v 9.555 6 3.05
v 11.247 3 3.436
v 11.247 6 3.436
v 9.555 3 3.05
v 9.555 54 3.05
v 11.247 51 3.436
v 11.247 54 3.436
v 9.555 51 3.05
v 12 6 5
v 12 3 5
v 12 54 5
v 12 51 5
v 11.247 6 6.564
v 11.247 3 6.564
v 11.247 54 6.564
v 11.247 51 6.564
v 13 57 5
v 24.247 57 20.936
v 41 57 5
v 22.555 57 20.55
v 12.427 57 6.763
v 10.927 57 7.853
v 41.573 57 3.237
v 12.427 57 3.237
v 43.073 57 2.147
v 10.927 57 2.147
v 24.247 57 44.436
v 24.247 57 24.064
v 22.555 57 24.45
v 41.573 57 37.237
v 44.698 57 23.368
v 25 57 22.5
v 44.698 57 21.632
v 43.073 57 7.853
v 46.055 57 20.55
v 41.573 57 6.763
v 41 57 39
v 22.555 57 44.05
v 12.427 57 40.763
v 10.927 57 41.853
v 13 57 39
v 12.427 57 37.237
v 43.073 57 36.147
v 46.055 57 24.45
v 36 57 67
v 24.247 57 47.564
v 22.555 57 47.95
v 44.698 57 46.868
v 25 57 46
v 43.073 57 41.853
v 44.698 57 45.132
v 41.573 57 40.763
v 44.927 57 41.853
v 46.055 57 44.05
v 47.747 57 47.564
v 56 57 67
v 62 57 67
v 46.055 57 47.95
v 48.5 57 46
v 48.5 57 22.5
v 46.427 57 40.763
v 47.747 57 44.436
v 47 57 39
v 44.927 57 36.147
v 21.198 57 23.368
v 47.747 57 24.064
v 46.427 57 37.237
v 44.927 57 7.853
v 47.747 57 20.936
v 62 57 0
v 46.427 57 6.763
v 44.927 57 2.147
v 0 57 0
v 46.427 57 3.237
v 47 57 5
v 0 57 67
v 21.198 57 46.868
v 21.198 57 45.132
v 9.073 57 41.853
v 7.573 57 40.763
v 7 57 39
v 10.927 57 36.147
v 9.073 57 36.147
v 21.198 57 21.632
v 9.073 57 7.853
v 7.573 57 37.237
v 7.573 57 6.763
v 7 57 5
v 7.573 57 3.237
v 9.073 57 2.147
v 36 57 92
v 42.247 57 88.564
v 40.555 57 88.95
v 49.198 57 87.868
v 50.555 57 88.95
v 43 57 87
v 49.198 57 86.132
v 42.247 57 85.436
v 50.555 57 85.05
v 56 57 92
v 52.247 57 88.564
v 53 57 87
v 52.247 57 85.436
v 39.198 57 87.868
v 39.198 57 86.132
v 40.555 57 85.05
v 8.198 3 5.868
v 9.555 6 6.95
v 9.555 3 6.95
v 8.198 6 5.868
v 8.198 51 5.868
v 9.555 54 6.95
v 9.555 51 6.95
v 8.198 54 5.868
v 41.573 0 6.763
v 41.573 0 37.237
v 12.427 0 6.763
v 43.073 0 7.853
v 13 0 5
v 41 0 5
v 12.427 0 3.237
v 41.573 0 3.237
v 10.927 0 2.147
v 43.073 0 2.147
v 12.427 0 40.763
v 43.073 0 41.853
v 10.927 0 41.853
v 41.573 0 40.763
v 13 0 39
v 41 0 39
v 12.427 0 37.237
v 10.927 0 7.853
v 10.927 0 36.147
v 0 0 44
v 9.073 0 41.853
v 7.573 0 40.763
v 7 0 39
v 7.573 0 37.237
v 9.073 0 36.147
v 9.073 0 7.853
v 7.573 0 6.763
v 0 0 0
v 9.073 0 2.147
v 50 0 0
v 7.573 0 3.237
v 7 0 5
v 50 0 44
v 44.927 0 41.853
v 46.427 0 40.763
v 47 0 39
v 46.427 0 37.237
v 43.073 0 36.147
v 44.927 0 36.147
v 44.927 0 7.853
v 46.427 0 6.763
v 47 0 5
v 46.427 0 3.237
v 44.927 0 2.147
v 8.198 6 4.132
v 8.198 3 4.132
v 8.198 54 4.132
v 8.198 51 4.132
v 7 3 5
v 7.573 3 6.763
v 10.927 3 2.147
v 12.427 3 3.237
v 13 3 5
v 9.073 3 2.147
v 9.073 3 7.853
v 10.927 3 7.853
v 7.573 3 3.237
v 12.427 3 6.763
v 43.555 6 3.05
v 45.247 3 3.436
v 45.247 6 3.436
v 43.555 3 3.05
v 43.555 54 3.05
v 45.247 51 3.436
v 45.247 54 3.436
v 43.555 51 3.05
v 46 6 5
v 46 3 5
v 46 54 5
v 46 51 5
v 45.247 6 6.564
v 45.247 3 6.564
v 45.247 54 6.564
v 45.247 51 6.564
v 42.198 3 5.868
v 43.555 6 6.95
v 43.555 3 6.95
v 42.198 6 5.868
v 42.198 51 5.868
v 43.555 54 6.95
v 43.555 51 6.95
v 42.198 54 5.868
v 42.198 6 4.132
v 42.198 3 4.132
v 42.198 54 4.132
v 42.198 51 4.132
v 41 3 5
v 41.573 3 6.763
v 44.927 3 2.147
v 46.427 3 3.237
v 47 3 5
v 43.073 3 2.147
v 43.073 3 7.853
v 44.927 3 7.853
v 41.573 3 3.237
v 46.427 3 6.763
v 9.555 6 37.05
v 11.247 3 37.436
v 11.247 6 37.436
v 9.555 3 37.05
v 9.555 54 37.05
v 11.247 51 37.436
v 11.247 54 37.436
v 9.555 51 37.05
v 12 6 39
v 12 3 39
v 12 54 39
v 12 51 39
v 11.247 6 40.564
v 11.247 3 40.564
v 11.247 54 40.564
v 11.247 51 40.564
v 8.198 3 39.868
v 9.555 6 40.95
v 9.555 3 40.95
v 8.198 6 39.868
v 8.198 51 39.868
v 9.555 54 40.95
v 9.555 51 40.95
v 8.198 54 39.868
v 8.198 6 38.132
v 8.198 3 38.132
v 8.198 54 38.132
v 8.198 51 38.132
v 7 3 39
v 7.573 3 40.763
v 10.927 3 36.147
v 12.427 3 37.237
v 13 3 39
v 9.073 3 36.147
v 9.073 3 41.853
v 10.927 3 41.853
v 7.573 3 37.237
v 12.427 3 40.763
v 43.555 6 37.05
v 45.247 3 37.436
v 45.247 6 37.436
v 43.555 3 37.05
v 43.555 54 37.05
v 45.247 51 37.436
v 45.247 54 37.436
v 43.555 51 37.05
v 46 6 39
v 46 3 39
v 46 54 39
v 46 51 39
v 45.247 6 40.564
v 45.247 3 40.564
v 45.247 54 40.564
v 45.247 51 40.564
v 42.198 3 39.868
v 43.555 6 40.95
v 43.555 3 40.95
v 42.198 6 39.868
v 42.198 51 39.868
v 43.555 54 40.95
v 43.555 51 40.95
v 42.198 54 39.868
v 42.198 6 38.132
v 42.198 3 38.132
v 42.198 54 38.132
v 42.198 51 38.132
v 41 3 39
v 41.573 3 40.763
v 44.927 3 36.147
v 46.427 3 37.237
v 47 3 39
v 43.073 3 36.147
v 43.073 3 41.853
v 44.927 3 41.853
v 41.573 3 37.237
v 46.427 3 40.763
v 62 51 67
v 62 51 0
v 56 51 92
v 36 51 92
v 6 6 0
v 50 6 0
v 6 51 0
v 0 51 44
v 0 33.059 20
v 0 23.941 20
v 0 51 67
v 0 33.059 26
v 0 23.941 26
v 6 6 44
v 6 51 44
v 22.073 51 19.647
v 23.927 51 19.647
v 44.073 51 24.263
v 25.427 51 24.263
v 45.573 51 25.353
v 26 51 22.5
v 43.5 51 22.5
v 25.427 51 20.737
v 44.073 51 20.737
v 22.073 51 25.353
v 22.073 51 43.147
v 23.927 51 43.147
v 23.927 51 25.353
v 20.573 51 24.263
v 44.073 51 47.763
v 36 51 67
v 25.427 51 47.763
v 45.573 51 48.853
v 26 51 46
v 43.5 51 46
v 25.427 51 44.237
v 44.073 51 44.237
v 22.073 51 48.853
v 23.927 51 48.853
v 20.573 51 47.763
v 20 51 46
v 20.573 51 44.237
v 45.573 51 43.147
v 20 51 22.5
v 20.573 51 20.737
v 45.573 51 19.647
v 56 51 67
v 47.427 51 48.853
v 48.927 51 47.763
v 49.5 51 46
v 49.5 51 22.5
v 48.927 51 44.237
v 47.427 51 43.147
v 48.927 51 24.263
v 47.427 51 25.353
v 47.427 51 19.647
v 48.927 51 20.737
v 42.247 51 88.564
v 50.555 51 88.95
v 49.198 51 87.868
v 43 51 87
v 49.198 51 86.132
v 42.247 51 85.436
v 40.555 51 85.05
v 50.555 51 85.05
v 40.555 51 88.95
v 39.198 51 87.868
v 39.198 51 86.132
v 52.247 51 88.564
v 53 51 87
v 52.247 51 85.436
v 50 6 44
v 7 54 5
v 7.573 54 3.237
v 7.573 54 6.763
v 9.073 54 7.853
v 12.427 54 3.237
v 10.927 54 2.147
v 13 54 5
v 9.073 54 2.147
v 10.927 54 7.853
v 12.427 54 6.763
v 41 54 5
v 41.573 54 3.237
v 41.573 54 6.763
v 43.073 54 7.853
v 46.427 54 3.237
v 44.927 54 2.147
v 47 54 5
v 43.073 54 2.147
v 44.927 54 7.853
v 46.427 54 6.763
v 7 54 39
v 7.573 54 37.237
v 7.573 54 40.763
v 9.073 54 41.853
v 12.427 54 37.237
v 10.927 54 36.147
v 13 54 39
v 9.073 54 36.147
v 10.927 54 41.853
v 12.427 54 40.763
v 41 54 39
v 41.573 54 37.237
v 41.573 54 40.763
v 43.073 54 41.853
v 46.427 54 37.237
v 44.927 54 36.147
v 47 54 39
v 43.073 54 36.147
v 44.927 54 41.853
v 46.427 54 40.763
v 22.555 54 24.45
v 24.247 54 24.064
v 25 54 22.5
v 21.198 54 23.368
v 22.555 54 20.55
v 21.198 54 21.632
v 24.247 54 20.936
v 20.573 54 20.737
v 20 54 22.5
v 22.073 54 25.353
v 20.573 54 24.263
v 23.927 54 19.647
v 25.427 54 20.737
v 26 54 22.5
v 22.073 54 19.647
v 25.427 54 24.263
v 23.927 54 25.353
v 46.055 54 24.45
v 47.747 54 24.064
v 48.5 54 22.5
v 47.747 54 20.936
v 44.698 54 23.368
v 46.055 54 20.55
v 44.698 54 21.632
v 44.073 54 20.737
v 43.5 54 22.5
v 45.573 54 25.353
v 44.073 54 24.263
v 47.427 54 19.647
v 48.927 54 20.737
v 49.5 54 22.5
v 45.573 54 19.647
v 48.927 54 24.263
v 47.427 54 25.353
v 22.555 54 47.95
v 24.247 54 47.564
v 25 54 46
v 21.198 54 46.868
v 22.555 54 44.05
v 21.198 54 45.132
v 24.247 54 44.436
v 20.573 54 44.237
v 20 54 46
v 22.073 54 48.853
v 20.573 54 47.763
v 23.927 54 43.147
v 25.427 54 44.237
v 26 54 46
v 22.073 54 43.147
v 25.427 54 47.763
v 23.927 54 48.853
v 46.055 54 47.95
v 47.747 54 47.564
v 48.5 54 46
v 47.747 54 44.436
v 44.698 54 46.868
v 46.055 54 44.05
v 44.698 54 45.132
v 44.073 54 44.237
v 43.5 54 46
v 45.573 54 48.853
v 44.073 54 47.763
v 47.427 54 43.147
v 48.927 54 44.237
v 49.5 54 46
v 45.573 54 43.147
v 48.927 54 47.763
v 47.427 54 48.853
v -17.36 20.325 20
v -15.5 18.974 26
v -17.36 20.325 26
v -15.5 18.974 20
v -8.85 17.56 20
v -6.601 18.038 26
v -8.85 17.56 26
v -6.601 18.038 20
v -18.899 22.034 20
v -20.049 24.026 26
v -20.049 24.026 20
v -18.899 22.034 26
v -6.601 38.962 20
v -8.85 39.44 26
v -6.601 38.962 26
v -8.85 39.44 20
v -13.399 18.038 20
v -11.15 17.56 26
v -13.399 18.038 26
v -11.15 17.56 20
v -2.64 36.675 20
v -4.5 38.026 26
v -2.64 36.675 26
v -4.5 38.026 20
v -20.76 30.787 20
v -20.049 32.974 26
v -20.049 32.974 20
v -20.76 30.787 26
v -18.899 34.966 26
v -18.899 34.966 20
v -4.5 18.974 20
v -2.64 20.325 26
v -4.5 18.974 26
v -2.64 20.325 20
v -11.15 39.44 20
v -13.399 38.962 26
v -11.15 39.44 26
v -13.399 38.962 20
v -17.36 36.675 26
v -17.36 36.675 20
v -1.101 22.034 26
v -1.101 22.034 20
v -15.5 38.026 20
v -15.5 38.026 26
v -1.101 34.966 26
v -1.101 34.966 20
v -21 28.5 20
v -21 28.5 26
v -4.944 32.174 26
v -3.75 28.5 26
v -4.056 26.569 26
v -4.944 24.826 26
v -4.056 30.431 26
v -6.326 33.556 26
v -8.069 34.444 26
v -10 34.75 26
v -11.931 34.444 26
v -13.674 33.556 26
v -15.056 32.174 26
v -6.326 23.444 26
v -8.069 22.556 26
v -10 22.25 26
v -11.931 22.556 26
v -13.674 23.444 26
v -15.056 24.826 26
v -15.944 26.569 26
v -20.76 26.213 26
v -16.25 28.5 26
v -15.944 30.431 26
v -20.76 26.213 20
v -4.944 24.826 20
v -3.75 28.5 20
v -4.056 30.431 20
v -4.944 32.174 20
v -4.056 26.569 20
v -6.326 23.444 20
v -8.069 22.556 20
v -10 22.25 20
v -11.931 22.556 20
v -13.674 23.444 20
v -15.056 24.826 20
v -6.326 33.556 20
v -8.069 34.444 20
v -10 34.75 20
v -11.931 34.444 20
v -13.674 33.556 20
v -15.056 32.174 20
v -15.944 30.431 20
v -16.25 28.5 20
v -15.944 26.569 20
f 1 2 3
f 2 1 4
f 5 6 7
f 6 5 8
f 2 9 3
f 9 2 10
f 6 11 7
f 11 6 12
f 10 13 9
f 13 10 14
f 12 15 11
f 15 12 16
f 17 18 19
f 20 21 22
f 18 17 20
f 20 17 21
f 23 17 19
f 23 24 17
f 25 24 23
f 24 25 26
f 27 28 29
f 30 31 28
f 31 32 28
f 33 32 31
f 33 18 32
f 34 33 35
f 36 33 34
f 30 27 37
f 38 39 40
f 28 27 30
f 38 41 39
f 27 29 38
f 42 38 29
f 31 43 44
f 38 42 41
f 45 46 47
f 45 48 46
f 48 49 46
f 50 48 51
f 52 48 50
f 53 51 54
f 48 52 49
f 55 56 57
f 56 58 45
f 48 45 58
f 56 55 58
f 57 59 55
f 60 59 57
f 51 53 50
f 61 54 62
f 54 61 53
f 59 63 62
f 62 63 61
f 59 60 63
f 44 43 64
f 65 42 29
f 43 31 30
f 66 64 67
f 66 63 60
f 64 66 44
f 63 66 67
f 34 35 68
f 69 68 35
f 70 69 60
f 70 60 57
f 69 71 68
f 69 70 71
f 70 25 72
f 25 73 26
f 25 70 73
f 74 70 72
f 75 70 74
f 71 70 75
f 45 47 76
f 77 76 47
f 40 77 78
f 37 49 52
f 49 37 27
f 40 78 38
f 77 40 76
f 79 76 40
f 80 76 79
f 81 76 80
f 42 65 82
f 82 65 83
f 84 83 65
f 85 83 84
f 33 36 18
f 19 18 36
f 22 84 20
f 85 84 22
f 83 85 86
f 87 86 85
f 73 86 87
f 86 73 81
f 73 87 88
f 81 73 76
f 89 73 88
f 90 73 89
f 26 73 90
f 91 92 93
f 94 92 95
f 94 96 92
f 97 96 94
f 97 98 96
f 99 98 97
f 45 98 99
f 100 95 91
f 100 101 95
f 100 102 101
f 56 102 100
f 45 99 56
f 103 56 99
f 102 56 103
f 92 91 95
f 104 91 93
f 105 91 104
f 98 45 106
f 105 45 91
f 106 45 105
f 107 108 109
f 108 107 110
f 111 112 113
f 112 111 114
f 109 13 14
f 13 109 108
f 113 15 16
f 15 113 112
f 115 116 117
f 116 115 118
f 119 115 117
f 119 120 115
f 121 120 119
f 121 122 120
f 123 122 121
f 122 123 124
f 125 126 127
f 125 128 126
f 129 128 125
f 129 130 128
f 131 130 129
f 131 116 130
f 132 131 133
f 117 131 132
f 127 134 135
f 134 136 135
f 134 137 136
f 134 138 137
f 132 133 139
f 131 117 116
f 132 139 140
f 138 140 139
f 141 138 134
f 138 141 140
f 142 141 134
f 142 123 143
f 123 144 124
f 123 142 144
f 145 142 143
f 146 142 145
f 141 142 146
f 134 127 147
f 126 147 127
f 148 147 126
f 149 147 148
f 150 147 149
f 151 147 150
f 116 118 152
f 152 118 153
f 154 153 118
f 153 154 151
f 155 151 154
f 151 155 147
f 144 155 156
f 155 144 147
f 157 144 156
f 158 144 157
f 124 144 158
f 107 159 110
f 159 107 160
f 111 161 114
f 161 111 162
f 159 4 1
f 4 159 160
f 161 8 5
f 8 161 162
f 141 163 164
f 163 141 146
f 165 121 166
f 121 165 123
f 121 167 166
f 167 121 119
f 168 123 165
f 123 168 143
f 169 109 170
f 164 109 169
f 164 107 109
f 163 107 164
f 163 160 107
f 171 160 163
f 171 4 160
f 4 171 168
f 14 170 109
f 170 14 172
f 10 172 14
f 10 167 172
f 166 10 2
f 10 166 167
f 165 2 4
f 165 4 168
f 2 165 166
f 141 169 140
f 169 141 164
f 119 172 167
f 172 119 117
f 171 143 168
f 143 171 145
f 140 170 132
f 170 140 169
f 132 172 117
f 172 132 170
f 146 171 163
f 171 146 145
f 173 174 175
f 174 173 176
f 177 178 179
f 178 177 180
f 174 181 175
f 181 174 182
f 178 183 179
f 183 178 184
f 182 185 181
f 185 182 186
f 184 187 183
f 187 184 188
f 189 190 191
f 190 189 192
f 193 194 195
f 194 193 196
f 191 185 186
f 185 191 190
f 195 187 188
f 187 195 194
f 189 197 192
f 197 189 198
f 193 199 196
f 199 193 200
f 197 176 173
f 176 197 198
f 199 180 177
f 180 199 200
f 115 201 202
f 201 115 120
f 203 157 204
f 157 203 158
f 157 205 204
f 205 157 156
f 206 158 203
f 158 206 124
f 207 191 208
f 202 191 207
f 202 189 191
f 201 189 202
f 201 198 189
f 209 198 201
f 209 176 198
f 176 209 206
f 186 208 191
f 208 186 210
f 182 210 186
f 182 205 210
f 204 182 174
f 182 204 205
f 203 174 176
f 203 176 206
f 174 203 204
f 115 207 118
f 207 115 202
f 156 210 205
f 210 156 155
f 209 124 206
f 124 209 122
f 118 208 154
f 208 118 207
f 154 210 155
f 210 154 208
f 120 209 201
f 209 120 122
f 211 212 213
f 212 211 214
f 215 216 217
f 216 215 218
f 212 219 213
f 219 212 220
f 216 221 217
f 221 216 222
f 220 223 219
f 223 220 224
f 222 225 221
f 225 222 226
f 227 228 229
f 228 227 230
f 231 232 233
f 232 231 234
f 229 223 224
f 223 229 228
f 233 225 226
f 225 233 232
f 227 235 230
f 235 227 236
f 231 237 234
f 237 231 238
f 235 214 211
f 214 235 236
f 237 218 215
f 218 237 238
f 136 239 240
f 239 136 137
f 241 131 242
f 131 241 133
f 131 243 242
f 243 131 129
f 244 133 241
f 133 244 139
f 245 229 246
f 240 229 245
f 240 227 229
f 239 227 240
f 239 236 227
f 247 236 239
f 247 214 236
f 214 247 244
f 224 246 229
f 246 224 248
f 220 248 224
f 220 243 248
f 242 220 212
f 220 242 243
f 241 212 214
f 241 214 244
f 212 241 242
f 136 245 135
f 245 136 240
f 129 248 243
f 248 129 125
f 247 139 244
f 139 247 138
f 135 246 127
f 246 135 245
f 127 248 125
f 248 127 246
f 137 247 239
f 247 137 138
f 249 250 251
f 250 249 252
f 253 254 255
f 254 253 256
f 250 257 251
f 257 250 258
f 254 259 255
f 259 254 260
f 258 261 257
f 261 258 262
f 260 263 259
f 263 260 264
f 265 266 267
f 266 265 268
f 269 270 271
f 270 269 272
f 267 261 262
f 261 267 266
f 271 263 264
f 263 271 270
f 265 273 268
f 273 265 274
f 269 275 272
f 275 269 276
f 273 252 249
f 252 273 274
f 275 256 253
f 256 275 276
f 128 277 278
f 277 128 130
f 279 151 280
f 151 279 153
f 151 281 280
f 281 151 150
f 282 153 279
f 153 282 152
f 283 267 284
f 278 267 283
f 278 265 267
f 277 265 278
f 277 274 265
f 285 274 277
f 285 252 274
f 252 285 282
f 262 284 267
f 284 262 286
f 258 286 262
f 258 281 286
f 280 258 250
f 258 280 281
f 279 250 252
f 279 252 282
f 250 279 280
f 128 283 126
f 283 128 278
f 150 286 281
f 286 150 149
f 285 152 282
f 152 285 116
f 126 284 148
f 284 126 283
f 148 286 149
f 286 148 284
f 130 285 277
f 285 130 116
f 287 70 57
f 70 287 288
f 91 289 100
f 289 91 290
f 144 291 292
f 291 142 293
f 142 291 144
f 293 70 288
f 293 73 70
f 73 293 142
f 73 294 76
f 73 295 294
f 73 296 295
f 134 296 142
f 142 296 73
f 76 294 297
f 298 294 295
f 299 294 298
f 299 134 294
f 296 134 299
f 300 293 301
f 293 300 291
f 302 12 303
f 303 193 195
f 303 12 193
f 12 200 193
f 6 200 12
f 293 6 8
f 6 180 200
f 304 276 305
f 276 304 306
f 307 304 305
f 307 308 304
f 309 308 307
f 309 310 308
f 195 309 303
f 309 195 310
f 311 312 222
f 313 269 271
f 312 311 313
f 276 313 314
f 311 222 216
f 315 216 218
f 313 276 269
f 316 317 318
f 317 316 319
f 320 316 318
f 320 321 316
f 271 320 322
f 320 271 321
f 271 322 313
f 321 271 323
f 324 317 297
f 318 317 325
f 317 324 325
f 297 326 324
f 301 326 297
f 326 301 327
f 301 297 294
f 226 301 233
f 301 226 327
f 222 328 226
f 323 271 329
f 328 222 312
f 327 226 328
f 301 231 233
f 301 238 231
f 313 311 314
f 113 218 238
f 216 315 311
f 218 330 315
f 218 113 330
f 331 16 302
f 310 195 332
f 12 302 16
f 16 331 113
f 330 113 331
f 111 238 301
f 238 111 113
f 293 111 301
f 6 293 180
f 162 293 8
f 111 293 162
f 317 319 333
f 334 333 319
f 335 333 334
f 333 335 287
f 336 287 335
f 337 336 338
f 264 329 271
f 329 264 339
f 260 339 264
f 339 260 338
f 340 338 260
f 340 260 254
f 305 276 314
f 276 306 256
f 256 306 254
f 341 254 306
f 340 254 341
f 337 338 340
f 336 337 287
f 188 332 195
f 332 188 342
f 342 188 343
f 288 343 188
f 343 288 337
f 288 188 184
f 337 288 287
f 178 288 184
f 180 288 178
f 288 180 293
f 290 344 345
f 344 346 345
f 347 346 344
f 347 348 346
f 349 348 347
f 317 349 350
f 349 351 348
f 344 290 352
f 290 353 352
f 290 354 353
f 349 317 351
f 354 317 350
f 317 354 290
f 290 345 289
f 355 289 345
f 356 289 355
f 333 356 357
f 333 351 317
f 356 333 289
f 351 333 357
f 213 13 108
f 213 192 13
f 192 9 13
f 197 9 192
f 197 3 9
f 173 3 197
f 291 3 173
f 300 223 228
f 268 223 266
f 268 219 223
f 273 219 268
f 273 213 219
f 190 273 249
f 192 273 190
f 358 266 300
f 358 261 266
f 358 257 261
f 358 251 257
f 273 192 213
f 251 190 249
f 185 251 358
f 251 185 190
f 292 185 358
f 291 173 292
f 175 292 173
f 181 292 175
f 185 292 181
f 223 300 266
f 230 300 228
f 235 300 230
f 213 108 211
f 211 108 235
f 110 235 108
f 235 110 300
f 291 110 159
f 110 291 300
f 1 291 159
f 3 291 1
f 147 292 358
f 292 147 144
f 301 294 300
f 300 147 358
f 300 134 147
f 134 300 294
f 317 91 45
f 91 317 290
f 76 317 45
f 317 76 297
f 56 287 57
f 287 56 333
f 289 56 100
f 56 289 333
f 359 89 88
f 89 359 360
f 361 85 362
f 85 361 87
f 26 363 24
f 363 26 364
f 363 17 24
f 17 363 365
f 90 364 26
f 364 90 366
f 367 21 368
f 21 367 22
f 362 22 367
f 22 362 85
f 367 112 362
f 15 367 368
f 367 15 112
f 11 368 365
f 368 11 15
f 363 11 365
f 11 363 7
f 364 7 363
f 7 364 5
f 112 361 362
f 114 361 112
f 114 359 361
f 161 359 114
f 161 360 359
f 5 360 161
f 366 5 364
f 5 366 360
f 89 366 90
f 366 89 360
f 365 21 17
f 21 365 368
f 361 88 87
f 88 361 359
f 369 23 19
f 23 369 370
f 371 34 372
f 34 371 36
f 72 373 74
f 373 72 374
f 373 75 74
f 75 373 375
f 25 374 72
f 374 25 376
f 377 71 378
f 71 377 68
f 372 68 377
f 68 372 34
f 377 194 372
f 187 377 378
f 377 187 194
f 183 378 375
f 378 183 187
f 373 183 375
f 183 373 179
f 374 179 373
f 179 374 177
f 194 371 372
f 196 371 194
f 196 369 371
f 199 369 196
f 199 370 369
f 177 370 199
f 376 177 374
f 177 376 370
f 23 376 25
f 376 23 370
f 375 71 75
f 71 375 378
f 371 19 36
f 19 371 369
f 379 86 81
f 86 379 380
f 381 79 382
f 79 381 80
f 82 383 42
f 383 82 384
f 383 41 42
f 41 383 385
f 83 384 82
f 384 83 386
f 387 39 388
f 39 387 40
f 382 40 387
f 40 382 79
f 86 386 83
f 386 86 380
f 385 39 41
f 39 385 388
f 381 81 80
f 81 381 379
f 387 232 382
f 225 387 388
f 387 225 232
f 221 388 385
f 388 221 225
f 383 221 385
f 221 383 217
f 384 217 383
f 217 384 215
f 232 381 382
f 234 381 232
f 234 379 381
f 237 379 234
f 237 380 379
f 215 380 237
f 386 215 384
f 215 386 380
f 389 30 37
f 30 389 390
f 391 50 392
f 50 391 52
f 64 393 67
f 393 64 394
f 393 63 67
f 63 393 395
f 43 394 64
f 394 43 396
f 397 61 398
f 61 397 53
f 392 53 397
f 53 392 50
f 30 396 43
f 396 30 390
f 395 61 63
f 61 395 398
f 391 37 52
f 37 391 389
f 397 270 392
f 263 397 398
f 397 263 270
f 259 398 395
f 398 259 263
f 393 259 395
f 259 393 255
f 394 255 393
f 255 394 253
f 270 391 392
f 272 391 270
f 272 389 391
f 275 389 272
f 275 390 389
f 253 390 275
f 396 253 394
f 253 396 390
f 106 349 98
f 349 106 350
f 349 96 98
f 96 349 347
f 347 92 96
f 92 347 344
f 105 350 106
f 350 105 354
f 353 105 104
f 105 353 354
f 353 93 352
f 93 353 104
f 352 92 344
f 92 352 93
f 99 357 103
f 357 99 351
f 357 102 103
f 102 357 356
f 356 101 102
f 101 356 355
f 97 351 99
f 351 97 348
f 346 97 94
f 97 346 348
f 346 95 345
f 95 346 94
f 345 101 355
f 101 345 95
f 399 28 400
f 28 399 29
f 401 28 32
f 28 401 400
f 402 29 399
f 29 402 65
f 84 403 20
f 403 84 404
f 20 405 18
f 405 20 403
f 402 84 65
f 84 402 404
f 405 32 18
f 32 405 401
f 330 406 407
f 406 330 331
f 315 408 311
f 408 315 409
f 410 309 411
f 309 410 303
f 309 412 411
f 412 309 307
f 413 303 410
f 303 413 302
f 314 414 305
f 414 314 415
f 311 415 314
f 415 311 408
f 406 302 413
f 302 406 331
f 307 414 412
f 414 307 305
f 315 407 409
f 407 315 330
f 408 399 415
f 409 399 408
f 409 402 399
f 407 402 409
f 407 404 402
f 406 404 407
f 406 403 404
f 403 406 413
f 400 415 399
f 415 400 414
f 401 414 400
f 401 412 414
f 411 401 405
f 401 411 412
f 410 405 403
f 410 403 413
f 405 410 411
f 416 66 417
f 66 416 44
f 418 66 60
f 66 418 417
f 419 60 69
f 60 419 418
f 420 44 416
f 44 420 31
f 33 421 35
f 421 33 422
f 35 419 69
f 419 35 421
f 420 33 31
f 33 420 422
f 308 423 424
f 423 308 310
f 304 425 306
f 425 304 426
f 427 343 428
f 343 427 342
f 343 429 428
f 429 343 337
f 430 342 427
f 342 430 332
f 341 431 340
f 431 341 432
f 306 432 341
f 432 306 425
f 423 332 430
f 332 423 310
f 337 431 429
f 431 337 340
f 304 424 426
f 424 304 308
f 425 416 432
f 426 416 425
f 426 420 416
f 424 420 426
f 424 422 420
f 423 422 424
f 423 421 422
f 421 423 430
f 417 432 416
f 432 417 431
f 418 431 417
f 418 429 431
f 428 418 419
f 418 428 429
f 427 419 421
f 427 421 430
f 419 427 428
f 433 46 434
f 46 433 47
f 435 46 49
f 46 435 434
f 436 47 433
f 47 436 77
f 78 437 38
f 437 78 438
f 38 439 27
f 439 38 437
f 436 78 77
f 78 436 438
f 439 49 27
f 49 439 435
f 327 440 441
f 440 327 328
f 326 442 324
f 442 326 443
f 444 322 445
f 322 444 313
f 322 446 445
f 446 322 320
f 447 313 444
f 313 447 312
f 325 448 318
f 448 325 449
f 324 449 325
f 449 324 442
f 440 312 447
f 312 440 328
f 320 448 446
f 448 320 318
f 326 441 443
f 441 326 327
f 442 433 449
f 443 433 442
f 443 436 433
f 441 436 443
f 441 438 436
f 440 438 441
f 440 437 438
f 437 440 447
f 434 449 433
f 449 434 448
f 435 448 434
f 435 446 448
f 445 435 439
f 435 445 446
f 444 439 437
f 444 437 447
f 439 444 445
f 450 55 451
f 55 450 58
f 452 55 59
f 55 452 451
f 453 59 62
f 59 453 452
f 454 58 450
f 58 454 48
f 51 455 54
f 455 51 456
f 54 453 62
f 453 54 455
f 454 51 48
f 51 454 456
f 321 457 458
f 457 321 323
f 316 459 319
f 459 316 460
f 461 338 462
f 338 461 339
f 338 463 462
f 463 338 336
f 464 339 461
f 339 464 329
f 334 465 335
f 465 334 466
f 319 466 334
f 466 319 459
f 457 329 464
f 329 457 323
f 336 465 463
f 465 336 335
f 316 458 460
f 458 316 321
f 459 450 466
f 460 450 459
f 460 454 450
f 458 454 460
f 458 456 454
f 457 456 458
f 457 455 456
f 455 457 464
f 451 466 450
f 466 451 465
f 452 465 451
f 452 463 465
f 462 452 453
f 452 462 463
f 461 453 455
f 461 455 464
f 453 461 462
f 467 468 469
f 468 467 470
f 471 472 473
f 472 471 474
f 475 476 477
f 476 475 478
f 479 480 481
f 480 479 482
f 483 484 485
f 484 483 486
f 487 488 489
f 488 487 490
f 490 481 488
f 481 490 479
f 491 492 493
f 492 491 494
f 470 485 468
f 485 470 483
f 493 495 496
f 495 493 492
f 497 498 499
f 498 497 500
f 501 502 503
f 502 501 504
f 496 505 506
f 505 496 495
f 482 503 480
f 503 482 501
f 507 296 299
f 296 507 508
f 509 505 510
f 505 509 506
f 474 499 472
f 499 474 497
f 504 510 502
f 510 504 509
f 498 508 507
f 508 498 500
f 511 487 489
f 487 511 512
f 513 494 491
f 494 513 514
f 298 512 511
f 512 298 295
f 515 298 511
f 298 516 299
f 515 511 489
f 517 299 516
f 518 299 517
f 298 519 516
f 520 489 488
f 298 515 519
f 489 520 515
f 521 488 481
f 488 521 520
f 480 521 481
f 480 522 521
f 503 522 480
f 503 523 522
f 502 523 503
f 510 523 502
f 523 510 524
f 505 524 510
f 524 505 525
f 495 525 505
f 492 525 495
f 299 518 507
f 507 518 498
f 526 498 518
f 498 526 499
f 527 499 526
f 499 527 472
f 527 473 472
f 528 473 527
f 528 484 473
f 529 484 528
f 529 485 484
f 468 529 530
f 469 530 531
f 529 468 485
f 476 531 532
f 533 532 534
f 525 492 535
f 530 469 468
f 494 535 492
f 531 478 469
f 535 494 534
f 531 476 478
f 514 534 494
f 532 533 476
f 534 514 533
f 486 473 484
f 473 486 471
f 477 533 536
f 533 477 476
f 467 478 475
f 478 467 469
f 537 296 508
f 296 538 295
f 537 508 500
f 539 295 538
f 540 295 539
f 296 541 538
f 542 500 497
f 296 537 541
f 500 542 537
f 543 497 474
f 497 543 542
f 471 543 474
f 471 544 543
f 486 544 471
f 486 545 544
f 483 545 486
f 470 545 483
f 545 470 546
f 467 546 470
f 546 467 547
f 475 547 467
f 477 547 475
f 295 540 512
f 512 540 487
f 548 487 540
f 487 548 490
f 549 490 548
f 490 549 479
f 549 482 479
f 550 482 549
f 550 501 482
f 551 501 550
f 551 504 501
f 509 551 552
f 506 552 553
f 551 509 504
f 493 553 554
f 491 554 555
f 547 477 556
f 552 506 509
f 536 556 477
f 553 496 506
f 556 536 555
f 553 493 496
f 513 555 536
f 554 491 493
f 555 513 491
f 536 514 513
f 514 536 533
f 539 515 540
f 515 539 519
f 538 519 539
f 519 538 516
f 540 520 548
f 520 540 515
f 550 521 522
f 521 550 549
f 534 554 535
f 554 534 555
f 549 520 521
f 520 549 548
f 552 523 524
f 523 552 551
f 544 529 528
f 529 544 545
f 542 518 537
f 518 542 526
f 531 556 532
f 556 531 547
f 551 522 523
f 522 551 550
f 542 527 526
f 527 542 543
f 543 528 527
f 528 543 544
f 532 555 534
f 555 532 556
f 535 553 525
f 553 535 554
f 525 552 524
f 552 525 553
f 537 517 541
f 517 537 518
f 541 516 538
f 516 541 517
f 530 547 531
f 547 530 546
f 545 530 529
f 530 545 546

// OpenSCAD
thickness = 6;
m3_sinkhole_depth = 3;
m3_sinkhole_diam = 3;
m3_diam = 2;
hermes_depth = 45;
hermes_height = 44;
hermes_width = 44;
hermes_hole_spacing = 34;
backplate_width = 62;
backplate_height = 92;
lip_height = 25;
lip_width = 20;
lip_pos_left_x = 36;
hole_spacing_left = 4;
hole_spacing_height = 5;
hole_depth = thickness + hermes_depth + thickness;
xmount_spacing = 23.5;
xmount_x_offset = thickness + 17;
xmount_y_offset = thickness + hermes_depth + thickness;
xmount_y_offset_sinkhole = thickness + hermes_depth;
xmount_z_offset = 22.5;

// Taken from https://gist.github.com/Stemer114/7e420ea8ad9733c4e0ba
module ring(
        h = 1,
        od = 10,
        id = 5,
        de = 0.1
        ) 
{
    difference() {
        cylinder(h=h, r=od/2);
        translate([0, 0, -de])
            cylinder(h=h+2*de, r=id/2);
    }
}

difference()
{
    // Outer block.
    cube([backplate_width, hermes_depth + thickness +       thickness, backplate_height]);
    
    // Make hollow.
    translate([thickness, thickness, 0])
    {
        cube([backplate_width, hermes_depth, backplate_height]);
    }
    
    // Take top of front-corner.
    translate([0, 0, hermes_height])
    {
       cube([hermes_width + thickness, hermes_depth + thickness, backplate_height]);
    }
    
    // Make front panel less broad.
    translate([thickness + hermes_width, 0, 0])
    {
        cube([hermes_width, thickness, backplate_height]);
    }
    
    // Remove space left of cable-lip.
    translate([0, thickness + hermes_depth, backplate_height - lip_height])
    {
        cube([lip_pos_left_x, thickness, lip_height]);
    }
    
    // Remove space right of cable-lip.
    translate([lip_pos_left_x + lip_width, thickness + hermes_depth, backplate_height - lip_height])
    {
        cube([backplate_width - lip_width, thickness, lip_height]);
    }
    
    // Left-lower screw-hole for Hermes.
    translate([thickness + hole_spacing_left, 0, hole_spacing_height])
    {
        rotate(a = [-90, 0 , 0])
        {
            cylinder(h = hole_depth, r = m3_diam);
            cylinder(h = m3_sinkhole_depth, r = 
m3_sinkhole_diam);
        }
    }
    // Sink-hole.
    translate([thickness + hole_spacing_left, thickness + hermes_depth + m3_sinkhole_depth, hole_spacing_height])
    {
        rotate(a = [-90, 0 , 0])
        {
            cylinder(h = m3_sinkhole_depth, r = m3_sinkhole_diam);
        }
    }
    
    // Lower-right screw-hole for Hermes;
    translate([thickness + hole_spacing_left + hermes_hole_spacing, 0, hole_spacing_height])
    {
        rotate(a = [-90, 0 , 0])
        {
            cylinder(h = hole_depth, r = m3_diam);
            cylinder(h = m3_sinkhole_depth, r = 
m3_sinkhole_diam);
        }
    }
    // Sink-hole.
    translate([thickness + hole_spacing_left + hermes_hole_spacing, thickness + hermes_depth + m3_sinkhole_depth, hole_spacing_height])
    {
        rotate(a = [-90, 0 , 0])
        {
            cylinder(h = m3_sinkhole_depth, r = m3_sinkhole_diam);
        }
    }
    
    // Left-upper screw-hole for Hermes.
    translate([thickness + hole_spacing_left, 0, hole_spacing_height + hermes_hole_spacing])
    {
        rotate(a = [-90, 0 , 0])
        {
            cylinder(h = hole_depth, r = m3_diam);
            cylinder(h = m3_sinkhole_depth, r = 
m3_sinkhole_diam);
        }
    }
    // Sink-hole.
    translate([thickness + hole_spacing_left, thickness + hermes_depth + m3_sinkhole_depth, hole_spacing_height + hermes_hole_spacing])
    {
        rotate(a = [-90, 0 , 0])
        {
            cylinder(h = m3_sinkhole_depth, r = m3_sinkhole_diam);
        }
    }
    
    // Right-upper screw-hole for Hermes.
    translate([thickness + hole_spacing_left + hermes_hole_spacing, 0, hole_spacing_height + hermes_hole_spacing])
    {
        rotate(a = [-90, 0 , 0])
        {
            cylinder(h = hole_depth, r = m3_diam);
            cylinder(h = m3_sinkhole_depth, r = 
m3_sinkhole_diam);
        }
    }
    // Sink-hole.
    translate([thickness + hole_spacing_left + hermes_hole_spacing, thickness + hermes_depth + m3_sinkhole_depth, hole_spacing_height + hermes_hole_spacing])
    {
        rotate(a = [-90, 0 , 0])
        {
            cylinder(h = m3_sinkhole_depth, r = m3_sinkhole_diam);
        }
    }
    
    // Tie-wrap holes in cable-lip, left.
    translate([lip_pos_left_x + hole_spacing_height, thickness + hermes_depth, backplate_height - hole_spacing_height])
    {
        rotate(a = [-90, 0 , 0])
        {
            cylinder(h = hole_depth, r = m3_diam);

        }
    }
    
    // Tie-wrap holes in cable-lip, right.
    translate([lip_pos_left_x + lip_width - hole_spacing_height, thickness + hermes_depth, backplate_height - hole_spacing_height])
    {
        rotate(a = [-90, 0 , 0])
        {
            cylinder(h = hole_depth, r = m3_diam);

        }
    }
    
    // X-mount hole, lower-left.
    translate([xmount_x_offset, xmount_y_offset, xmount_z_offset])
    {
        rotate(a = [90, 0 , 0])
        {
            cylinder(h = thickness, r = m3_diam);
        }
    }
    // Sink-hole.
    translate([xmount_x_offset, xmount_y_offset - thickness, xmount_z_offset])
    {
        rotate(a = [-90, 0 , 0])
        {
            cylinder(h = m3_sinkhole_depth, r = m3_sinkhole_diam);
        }
    }
    
    // X-mount hole, lower-right.
    translate([xmount_x_offset + xmount_spacing, xmount_y_offset, xmount_z_offset])
    {
        rotate(a = [90, 0 , 0])
        {
            cylinder(h = thickness, r = m3_diam);
        }
    }
    // Sink-hole.
    translate([xmount_x_offset + xmount_spacing, xmount_y_offset - thickness, xmount_z_offset])
    {
        rotate(a = [-90, 0 , 0])
        {
            cylinder(h = m3_sinkhole_depth, r = m3_sinkhole_diam);
        }
    }
    
    // X-mount hole, upper-left.
    translate([xmount_x_offset, xmount_y_offset, xmount_z_offset + xmount_spacing])
    {
        rotate(a = [90, 0 , 0])
        {
            cylinder(h = thickness, r = m3_diam);
        }
    }
    // Sink-hole.
    translate([xmount_x_offset, xmount_y_offset - thickness, xmount_z_offset + xmount_spacing])
    {
        rotate(a = [-90, 0 , 0])
        {
            cylinder(h = m3_sinkhole_depth, r = m3_sinkhole_diam);
        }
    }

    // X-mount hole, upper-right.
   translate([xmount_x_offset + xmount_spacing, xmount_y_offset, xmount_z_offset + xmount_spacing])
    {
        rotate(a = [90, 0 , 0])
        {
            cylinder(h = thickness, r = m3_diam);
        }
    }
    // Sink-hole.
    translate([xmount_x_offset + xmount_spacing, xmount_y_offset - thickness, xmount_z_offset + xmount_spacing])
    {
        rotate(a = [-90, 0 , 0])
        {
            cylinder(h = m3_sinkhole_depth, r = m3_sinkhole_diam);
        }
    }

}

// Z-probe ring.
translate([-10, (thickness + hermes_depth + thickness) / 2, 20])
{
    ring(h = thickness, od = 22, id = 12.5, de = 0.1);
}
